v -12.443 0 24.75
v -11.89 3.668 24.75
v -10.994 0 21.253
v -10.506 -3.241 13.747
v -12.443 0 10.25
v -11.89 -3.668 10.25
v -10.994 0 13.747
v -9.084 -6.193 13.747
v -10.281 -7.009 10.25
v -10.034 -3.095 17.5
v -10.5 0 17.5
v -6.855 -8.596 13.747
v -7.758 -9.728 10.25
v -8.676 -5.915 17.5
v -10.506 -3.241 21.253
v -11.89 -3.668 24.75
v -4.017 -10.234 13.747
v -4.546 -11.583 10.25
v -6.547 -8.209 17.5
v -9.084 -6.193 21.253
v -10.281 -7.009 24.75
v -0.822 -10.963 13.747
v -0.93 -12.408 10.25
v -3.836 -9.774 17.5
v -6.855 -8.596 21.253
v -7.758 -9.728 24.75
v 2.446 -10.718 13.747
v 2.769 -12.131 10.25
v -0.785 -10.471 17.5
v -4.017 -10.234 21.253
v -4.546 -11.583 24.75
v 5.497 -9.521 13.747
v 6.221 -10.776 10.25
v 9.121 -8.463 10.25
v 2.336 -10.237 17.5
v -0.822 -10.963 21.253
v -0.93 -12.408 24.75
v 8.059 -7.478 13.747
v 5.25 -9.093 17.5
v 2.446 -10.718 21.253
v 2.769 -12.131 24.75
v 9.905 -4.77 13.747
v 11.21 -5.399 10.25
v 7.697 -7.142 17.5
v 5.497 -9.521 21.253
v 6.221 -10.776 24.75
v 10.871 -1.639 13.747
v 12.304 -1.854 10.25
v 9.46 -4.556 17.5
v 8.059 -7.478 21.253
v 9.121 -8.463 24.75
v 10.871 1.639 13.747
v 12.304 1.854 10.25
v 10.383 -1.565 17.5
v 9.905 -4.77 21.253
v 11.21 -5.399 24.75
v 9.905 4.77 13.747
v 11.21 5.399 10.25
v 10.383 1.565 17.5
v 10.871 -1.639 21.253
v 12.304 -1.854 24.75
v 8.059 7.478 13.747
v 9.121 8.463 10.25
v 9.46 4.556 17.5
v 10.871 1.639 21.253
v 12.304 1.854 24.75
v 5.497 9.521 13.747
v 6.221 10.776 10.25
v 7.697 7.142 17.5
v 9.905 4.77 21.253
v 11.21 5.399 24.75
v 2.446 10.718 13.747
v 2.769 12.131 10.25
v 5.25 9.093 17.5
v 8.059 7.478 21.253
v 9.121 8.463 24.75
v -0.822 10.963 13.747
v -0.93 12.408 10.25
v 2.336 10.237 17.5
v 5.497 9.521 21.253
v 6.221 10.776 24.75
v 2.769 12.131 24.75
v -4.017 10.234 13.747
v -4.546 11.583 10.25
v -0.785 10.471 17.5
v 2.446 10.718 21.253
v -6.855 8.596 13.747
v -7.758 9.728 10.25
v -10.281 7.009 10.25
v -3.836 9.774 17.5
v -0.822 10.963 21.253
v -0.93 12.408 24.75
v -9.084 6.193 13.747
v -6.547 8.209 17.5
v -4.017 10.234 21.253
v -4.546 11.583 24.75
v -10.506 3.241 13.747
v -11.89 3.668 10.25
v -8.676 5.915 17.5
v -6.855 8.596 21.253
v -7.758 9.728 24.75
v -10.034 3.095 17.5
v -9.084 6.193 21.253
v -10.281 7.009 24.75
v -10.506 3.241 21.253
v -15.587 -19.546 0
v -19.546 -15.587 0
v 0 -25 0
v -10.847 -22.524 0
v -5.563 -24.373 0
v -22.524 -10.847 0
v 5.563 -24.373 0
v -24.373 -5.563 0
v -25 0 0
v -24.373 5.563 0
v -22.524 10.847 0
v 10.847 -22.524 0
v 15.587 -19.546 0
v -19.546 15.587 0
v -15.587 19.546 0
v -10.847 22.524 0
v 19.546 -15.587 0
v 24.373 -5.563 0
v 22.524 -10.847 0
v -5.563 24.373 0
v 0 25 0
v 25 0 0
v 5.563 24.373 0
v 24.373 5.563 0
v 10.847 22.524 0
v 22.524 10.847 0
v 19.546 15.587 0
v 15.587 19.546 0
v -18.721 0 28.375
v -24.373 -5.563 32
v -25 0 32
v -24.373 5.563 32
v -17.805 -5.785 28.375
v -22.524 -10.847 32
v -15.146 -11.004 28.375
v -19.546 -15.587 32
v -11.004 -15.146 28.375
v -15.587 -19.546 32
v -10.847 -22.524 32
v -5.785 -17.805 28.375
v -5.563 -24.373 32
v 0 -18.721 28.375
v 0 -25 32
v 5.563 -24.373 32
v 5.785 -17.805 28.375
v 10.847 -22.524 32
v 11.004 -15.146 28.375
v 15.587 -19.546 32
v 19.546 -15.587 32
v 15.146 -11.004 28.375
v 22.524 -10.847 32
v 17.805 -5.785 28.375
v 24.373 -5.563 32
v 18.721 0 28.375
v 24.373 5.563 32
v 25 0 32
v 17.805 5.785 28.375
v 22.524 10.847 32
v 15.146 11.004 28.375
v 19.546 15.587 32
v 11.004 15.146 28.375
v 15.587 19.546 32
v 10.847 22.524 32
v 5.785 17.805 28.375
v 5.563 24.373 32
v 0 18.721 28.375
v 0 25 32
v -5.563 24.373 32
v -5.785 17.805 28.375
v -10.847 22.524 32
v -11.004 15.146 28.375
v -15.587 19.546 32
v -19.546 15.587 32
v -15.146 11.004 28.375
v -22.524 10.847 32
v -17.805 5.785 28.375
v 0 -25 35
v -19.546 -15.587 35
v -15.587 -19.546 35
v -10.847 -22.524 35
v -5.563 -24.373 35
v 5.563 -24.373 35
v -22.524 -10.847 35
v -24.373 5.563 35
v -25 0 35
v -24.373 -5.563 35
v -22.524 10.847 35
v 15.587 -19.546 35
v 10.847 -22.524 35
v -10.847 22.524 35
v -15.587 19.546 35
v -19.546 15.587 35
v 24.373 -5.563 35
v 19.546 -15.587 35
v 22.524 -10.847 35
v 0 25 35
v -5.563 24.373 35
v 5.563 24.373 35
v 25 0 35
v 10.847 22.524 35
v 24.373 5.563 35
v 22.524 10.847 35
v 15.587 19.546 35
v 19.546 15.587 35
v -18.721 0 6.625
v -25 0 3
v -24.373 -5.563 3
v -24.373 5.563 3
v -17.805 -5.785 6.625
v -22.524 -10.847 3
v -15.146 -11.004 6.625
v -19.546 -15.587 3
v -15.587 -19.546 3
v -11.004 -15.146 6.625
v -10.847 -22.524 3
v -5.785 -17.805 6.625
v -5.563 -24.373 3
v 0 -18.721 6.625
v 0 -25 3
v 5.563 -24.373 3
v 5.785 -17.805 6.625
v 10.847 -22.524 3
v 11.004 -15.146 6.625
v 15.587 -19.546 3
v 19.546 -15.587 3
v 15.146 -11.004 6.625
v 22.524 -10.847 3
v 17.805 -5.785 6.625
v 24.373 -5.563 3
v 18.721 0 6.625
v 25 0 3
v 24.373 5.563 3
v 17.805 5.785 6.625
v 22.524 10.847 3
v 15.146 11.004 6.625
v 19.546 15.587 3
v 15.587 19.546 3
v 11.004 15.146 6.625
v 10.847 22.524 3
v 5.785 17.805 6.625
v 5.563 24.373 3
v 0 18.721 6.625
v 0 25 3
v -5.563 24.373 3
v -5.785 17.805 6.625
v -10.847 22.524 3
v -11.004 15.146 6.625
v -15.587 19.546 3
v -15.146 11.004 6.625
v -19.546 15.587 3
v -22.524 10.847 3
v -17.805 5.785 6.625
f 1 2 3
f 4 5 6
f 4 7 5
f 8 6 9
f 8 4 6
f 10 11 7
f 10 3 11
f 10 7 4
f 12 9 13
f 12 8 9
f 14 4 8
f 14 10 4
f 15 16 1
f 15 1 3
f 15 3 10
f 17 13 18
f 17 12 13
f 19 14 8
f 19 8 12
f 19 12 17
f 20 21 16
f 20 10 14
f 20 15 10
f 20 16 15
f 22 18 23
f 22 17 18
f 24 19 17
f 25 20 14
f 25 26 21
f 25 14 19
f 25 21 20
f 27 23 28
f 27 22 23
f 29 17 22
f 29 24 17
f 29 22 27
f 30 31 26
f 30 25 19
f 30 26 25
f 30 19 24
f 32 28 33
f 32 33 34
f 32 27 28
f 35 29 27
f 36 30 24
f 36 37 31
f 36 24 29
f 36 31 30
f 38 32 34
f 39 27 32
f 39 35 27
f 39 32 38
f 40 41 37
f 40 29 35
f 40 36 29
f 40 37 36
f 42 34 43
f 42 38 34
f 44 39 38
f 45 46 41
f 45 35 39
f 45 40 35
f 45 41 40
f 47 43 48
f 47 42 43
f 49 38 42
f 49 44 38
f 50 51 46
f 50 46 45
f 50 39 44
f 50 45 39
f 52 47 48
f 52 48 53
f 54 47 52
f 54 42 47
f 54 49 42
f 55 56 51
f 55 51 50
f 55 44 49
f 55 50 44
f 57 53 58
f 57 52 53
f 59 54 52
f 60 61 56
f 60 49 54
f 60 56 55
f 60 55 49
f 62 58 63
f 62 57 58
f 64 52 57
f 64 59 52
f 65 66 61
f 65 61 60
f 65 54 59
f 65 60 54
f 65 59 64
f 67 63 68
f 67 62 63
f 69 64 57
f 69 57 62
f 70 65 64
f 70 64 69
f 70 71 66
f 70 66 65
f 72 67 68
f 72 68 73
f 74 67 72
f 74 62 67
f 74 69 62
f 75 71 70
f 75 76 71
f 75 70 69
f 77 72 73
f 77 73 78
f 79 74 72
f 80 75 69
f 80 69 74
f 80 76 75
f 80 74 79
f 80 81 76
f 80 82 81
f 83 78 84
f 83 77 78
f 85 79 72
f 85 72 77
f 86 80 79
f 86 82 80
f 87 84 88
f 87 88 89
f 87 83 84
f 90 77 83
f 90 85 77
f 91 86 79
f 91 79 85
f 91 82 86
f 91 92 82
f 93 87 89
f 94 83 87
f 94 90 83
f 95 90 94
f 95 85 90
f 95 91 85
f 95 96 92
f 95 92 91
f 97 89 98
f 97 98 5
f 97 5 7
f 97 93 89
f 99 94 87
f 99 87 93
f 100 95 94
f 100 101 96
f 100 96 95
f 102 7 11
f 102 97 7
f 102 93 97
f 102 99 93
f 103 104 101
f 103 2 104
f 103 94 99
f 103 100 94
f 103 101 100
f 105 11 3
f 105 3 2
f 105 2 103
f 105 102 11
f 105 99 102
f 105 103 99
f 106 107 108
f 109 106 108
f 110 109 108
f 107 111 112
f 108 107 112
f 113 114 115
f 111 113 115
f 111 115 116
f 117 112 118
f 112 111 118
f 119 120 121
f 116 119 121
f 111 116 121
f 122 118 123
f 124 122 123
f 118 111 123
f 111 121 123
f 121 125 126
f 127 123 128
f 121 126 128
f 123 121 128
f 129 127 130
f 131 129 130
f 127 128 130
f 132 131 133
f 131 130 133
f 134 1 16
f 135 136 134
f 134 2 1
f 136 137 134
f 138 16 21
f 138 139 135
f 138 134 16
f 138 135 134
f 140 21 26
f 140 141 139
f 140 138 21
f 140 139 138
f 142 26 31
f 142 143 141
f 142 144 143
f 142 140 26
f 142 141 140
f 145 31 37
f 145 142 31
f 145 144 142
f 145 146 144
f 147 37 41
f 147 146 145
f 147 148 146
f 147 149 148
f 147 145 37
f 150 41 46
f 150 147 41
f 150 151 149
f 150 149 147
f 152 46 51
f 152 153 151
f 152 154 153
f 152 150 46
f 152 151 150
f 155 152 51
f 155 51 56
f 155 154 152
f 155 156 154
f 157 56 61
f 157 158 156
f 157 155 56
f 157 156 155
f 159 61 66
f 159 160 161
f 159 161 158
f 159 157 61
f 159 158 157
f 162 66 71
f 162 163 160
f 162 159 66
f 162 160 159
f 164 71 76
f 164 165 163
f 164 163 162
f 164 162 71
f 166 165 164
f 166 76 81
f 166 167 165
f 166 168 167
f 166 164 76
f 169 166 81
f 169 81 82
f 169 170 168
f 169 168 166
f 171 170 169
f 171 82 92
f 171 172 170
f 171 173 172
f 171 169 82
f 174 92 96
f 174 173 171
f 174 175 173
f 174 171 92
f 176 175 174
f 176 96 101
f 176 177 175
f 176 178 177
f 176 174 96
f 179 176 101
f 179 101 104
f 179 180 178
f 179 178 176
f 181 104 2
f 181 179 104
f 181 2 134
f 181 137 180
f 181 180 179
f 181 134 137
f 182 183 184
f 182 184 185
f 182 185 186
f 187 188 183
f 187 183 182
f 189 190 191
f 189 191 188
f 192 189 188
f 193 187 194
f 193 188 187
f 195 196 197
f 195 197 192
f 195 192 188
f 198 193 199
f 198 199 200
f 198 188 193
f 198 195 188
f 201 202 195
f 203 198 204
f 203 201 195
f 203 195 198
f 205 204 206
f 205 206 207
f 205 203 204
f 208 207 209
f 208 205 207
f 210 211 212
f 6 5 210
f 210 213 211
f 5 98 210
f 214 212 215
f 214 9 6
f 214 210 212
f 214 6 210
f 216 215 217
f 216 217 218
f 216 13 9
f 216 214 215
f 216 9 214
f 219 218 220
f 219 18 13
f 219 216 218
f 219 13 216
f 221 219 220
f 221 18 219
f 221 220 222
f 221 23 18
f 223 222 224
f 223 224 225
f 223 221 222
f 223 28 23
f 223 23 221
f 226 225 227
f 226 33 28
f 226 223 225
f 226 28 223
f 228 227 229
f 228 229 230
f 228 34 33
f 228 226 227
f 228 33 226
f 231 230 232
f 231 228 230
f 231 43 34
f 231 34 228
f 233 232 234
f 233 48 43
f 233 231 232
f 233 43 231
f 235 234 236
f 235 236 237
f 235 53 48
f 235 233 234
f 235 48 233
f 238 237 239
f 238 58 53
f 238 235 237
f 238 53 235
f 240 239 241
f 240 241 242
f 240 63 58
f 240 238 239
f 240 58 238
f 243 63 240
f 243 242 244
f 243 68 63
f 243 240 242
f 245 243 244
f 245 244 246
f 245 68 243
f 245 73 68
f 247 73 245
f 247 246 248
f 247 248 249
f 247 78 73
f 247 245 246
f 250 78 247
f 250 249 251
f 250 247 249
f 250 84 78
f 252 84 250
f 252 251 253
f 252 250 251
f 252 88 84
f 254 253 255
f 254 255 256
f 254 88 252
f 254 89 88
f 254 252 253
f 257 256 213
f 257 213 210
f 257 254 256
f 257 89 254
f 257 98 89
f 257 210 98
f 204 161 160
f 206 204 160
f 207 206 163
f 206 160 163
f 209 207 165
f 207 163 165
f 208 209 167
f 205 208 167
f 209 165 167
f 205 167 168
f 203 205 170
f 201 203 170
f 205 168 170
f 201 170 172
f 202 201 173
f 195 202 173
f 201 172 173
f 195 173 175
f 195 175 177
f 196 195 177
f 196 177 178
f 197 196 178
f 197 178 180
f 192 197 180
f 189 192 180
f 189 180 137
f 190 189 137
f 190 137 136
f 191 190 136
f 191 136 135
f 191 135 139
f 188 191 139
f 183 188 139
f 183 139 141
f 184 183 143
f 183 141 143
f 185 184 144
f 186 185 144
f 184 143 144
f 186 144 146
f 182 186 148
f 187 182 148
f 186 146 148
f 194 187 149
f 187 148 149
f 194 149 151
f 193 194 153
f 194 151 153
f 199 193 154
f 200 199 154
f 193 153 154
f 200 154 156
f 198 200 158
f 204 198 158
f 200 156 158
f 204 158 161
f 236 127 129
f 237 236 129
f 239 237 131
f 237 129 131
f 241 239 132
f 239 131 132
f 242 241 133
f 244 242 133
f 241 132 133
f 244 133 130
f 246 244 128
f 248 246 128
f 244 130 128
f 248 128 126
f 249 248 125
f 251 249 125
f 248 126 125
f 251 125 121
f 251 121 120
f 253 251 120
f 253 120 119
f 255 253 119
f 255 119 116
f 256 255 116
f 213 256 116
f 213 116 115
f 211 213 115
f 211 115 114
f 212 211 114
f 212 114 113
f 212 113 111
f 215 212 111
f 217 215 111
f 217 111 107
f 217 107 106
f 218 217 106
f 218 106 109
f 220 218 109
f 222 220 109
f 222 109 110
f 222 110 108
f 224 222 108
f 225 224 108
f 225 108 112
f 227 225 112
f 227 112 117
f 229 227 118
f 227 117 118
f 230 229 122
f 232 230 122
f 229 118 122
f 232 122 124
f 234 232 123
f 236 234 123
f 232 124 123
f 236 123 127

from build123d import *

# Parameters (mm, degrees)
F0_R     = 25
F1_DEPTH = 35


with BuildPart() as f1:
    # F0 (on Top) → F1 (new body)
    with BuildSketch(Plane.XY):
        Circle(F0_R)
    extrude(amount=F1_DEPTH)

    # F2 (on Front) → F3 (revolve, cut)
    with BuildSketch(Plane.XZ):
        with BuildLine():
            Line((-12.442632, 24.75), (-25, 32))
            Line((-25, 32), (-25, 3))
            Line((-25, 3), (-12.442632, 10.25))
            ThreePointArc((-12.442632, 10.25), (-10.5, 17.5), (-12.442632, 24.75))
        make_face()
    revolve(axis=Axis((0, 0, 17.5), (0, 0, 1)), mode=Mode.SUBTRACT)


solid = f1.part
